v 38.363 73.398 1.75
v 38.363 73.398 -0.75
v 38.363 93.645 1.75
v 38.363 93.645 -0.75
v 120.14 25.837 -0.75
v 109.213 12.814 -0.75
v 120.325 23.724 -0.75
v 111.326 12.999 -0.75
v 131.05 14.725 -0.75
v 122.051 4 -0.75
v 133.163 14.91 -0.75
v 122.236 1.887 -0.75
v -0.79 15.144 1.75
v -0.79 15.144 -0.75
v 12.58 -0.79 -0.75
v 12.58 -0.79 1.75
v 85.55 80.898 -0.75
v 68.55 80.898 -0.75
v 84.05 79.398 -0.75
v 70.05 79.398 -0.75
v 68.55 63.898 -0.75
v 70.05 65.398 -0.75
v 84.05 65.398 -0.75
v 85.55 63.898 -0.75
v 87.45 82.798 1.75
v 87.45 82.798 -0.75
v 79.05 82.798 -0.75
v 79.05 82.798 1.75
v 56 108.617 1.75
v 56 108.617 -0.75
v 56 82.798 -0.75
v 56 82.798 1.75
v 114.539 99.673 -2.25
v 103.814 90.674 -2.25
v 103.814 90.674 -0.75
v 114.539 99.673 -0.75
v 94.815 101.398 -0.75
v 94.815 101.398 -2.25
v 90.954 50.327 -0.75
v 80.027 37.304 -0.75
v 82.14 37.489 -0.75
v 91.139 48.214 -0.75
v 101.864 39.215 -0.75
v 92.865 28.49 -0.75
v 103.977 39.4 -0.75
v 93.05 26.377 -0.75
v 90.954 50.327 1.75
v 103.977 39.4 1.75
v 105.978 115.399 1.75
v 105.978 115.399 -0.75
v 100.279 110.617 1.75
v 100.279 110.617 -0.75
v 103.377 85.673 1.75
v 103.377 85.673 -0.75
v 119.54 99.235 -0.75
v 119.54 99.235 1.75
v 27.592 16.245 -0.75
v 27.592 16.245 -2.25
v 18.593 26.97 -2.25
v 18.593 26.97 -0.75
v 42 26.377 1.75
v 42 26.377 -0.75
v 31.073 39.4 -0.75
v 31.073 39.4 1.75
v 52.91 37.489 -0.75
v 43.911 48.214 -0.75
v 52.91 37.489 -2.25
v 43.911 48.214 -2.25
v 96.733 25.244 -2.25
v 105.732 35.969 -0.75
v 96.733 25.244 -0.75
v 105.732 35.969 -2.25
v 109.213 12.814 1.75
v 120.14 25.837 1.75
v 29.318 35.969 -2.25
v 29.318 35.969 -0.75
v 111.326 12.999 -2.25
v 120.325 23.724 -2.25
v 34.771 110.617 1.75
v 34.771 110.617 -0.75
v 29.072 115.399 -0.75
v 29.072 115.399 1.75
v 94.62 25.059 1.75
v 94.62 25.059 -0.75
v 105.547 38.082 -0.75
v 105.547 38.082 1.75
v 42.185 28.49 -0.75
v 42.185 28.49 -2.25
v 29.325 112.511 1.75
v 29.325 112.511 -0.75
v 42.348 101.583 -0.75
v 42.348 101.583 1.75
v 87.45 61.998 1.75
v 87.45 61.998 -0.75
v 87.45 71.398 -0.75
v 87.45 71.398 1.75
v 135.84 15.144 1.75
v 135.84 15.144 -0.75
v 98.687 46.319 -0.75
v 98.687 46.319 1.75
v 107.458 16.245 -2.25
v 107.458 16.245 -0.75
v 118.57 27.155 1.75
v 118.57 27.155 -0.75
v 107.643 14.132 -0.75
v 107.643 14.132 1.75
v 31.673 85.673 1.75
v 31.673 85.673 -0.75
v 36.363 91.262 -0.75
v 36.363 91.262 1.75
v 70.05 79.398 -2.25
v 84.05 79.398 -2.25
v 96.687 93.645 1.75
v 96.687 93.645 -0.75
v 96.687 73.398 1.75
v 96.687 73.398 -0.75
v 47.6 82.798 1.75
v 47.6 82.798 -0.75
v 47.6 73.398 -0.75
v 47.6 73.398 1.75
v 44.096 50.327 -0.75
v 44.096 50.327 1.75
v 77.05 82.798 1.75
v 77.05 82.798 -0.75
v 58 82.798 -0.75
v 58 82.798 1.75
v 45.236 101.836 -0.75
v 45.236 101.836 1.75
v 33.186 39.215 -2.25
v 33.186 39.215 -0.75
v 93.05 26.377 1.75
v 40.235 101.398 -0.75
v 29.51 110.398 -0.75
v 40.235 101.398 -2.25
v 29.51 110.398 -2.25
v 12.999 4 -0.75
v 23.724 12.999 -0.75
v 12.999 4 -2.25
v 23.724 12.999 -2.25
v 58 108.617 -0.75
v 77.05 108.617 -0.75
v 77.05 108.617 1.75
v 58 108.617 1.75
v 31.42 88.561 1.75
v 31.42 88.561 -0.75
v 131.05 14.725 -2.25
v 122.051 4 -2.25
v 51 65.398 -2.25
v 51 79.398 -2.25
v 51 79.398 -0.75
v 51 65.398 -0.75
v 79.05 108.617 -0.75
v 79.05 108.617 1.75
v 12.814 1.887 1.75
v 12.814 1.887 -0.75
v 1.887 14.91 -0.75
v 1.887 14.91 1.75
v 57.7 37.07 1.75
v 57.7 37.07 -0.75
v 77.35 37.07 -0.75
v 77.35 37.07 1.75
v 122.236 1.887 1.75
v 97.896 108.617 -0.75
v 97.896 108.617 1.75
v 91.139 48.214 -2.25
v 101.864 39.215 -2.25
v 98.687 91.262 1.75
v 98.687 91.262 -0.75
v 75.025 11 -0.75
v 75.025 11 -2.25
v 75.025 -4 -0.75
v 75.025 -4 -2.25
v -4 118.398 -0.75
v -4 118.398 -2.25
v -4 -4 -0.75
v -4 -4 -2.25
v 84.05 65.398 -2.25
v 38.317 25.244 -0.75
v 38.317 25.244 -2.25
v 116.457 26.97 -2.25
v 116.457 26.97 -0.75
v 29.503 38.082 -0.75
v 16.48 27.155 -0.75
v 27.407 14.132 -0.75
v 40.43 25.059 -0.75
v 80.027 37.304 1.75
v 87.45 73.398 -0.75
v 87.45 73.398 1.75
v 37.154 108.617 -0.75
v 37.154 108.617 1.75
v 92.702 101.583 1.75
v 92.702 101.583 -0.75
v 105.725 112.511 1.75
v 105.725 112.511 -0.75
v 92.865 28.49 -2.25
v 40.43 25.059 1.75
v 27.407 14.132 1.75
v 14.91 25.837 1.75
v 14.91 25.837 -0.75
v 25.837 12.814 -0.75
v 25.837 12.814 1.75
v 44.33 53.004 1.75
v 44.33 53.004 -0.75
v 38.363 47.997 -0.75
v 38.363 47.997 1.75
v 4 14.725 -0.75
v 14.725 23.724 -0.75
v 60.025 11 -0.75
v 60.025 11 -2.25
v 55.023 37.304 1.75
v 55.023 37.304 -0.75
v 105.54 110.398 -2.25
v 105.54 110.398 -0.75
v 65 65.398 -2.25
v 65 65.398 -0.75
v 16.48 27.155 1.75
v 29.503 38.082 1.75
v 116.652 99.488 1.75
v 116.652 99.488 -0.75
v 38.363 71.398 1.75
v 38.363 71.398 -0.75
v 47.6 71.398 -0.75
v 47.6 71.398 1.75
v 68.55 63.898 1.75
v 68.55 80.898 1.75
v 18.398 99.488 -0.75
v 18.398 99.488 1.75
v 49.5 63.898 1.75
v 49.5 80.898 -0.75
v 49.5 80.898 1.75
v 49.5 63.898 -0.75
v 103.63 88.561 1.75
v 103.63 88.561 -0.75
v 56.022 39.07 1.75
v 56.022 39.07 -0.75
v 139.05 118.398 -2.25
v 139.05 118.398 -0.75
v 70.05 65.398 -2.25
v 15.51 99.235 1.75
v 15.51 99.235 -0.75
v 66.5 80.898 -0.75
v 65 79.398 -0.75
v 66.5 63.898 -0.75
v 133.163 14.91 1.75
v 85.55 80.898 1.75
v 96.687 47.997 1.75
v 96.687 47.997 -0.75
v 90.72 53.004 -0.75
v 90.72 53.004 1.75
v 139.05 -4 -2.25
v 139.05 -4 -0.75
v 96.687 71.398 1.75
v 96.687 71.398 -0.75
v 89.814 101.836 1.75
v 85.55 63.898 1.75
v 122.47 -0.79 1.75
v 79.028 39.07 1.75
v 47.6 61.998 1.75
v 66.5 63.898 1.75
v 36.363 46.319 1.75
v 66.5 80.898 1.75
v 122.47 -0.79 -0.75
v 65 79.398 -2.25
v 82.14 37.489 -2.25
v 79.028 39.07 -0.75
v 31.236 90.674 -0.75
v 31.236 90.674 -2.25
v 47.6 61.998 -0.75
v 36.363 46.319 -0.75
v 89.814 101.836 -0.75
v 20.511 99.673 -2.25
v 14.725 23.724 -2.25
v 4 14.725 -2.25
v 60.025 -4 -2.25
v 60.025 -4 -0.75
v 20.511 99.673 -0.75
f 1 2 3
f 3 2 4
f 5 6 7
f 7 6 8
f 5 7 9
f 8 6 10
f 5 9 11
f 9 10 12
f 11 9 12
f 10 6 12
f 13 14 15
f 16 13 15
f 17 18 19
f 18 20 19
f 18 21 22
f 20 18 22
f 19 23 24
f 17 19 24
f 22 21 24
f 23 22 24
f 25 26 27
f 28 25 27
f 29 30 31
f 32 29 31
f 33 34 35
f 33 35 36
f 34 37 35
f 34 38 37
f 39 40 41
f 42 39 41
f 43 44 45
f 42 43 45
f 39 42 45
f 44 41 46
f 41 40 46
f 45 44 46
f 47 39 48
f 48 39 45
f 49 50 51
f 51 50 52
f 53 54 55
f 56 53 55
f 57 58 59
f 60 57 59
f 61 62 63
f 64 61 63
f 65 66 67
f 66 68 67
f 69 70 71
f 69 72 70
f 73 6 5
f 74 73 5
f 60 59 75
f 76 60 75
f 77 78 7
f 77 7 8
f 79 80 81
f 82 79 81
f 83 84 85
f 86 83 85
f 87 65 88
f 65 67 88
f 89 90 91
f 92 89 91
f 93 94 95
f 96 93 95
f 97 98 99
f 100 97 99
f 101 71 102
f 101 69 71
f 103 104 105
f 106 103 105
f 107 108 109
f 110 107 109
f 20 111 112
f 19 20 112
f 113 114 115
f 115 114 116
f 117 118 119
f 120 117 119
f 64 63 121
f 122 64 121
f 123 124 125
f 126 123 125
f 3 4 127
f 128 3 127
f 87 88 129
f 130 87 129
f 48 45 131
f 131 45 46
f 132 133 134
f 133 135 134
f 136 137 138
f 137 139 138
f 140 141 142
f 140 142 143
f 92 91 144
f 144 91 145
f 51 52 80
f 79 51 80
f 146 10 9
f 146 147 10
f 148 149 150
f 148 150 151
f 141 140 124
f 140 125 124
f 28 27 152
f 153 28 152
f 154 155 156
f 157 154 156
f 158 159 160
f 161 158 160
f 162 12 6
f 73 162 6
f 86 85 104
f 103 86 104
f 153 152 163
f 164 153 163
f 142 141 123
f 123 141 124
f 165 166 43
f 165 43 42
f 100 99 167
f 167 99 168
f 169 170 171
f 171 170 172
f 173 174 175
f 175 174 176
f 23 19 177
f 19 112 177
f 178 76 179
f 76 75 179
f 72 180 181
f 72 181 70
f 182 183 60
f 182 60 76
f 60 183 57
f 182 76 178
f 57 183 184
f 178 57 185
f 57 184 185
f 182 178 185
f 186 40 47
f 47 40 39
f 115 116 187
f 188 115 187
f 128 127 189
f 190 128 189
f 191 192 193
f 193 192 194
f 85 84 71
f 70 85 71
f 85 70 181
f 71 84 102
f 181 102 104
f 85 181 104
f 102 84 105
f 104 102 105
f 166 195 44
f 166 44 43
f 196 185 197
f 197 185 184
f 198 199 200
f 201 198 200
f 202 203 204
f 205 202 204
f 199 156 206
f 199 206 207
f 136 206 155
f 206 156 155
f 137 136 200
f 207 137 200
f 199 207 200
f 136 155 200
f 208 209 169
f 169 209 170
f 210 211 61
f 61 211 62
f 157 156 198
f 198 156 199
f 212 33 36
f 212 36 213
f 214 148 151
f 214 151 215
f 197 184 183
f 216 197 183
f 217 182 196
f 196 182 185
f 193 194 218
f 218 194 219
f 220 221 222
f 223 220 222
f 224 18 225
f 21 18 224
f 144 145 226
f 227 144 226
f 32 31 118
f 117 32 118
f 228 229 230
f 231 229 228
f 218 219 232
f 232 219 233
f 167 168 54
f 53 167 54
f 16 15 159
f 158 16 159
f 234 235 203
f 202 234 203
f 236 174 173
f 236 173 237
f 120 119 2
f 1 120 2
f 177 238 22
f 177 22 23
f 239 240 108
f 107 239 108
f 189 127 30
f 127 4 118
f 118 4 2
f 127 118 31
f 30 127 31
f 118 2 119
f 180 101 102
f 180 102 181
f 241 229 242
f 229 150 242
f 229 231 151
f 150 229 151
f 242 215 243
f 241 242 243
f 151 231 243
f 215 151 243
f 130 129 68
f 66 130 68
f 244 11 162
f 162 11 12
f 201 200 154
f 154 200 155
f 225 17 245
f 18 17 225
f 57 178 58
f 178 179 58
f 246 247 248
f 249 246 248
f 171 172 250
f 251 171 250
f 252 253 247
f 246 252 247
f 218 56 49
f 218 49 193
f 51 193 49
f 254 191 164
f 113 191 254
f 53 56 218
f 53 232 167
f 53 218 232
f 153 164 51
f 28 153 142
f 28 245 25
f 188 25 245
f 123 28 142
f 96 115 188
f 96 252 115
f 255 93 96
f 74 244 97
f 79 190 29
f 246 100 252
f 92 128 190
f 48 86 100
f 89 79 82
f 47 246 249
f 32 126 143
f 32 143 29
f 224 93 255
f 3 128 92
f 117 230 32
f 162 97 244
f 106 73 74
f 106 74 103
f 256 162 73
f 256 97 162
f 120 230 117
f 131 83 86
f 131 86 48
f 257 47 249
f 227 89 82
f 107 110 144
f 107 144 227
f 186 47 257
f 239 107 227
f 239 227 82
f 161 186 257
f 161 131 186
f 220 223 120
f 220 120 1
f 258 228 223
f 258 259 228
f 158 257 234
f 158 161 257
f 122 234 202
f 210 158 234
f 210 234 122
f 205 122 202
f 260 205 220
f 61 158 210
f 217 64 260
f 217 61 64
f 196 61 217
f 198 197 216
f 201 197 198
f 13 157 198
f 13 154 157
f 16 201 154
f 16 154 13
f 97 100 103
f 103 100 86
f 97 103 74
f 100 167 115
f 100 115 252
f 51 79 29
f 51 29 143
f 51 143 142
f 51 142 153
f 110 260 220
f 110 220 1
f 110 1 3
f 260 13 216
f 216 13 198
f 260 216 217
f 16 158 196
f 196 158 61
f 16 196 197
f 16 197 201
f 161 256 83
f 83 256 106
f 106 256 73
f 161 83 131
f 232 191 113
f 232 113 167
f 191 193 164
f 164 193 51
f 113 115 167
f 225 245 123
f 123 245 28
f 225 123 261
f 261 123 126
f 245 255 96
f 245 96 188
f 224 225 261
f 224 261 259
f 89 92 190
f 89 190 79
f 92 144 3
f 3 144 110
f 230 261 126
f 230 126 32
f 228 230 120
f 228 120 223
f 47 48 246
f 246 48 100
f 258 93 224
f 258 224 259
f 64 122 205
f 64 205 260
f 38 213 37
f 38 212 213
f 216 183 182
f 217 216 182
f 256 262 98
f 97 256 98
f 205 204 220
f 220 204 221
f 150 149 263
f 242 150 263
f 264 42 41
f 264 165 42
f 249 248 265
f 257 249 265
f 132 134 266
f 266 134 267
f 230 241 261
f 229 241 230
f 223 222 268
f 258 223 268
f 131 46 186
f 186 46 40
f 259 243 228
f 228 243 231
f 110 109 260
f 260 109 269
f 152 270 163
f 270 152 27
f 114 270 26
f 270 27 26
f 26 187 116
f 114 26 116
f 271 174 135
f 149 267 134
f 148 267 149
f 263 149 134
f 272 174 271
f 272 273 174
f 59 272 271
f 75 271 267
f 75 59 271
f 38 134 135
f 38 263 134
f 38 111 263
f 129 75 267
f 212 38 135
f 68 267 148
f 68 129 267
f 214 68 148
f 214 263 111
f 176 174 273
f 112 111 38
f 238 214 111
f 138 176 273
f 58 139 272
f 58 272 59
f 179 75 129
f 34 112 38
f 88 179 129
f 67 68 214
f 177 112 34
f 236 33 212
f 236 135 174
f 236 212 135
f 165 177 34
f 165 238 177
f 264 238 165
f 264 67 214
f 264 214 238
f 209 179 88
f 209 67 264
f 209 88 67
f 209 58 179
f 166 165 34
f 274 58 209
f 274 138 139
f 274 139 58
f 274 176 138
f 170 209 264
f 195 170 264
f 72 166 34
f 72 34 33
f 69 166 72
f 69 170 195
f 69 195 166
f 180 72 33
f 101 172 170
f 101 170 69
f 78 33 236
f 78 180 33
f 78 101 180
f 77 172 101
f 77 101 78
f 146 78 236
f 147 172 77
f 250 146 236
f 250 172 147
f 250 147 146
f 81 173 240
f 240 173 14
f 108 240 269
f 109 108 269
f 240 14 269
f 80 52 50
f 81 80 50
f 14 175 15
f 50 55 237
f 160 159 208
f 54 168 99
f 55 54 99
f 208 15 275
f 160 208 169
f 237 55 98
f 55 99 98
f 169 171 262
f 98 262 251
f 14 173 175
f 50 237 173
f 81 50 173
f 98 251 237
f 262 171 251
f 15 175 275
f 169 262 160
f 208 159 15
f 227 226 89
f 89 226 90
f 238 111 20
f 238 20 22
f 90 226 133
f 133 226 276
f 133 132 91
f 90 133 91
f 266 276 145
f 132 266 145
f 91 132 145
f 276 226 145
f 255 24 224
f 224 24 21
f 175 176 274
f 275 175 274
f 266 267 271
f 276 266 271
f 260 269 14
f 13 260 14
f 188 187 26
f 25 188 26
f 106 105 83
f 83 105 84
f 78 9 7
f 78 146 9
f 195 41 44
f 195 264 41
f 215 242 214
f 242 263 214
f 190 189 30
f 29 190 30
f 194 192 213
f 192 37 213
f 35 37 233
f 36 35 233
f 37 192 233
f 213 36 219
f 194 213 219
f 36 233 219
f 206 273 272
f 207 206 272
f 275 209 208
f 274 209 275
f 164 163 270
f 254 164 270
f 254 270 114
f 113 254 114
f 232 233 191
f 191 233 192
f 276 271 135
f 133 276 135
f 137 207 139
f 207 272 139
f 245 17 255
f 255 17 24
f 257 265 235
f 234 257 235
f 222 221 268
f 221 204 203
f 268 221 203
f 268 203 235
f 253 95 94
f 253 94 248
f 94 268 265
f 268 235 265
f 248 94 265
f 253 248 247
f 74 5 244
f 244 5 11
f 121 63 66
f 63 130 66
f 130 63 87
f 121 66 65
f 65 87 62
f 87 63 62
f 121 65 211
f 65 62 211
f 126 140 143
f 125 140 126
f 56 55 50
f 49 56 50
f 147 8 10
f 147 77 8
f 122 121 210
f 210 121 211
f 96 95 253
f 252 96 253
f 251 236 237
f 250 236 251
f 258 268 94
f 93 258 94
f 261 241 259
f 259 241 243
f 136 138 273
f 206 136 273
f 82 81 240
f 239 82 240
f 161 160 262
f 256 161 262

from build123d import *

# Parameters (mm, degrees)
MODEL_W                    = 143.05
MODEL_H                    = 122.397505408
MODEL_W_2                  = 14
MODEL_H_2                  = 14
SALIENTE_EXTRUIR1_DEPTH    = 0.75
CROQUIS2_W                 = 15
CROQUIS2_H                 = 30
CORTAR_EXTRUIR1_DEPTH      = 183.633846224
CROQUIS5_W                 = 19.05
CROQUIS5_H                 = 25.819944505
CROQUIS5_W_2               = 17
CROQUIS5_H_2               = 17
SALIENTE_EXTRUIR2_DEPTH    = 2.5
S_LIDO_MOVER_COPIAR1_ANGLE = 180


with BuildPart() as part:
    # Model → Saliente-Extruir1 (new, symmetric)
    with BuildSketch(Plane.XY):
        with Locations((67.525, 57.198752704)):
            Rectangle(MODEL_W, MODEL_H)
        with Locations((58, 42)):
            Rectangle(MODEL_W_2, MODEL_H_2, mode=Mode.SUBTRACT)
        Polygon((18.593146641, 87.427779239), (29.317768845, 78.428752704), (38.316795381, 89.153374907), (27.592173177, 98.152401443), align=None, mode=Mode.SUBTRACT)
        Polygon((103.814404332, 23.723648739), (114.539026536, 14.724622204), (105.54, 4), (94.815377796, 12.999026536), align=None, mode=Mode.SUBTRACT)
        Polygon((33.186293283, 75.182675275), (43.910915486, 66.183648739), (52.909942022, 76.908270943), (42.185319818, 85.907297479), align=None, mode=Mode.SUBTRACT)
        Polygon((20.510973464, 14.724622204), (29.51, 4), (40.234622204, 12.999026536), (31.235595668, 23.723648739), align=None, mode=Mode.SUBTRACT)
        with Locations((77.05, 42)):
            Rectangle(MODEL_W_2, MODEL_H_2, mode=Mode.SUBTRACT)
        Polygon((92.864680182, 85.907297479), (101.863706717, 75.182675275), (91.139084514, 66.183648739), (82.140057978, 76.908270943), align=None, mode=Mode.SUBTRACT)
        Polygon((107.457826823, 98.152401443), (116.456853359, 87.427779239), (105.732231155, 78.428752704), (96.733204619, 89.153374907), align=None, mode=Mode.SUBTRACT)
        Polygon((4, 99.672883204), (14.724622204, 90.673856668), (23.723648739, 101.398478872), (12.999026536, 110.397505408), align=None, mode=Mode.SUBTRACT)
        Polygon((120.325377796, 90.673856668), (111.326351261, 101.398478872), (122.050973464, 110.397505408), (131.05, 99.672883204), align=None, mode=Mode.SUBTRACT)
    extrude(amount=SALIENTE_EXTRUIR1_DEPTH, both=True)

    # Croquis2 → Cortar-Extruir1 (cut, through all)
    with BuildSketch(Plane.XY.offset(0.75)):
        with Locations((67.525, 118.397505408)):
            Rectangle(CROQUIS2_W, CROQUIS2_H)
    extrude(amount=-CORTAR_EXTRUIR1_DEPTH, mode=Mode.SUBTRACT)

    # Croquis5 → Saliente-Extruir2 (add)
    with BuildSketch(Plane(origin=(0, 0, -0.75), x_dir=(-1, 0, 0), z_dir=(0, 0, -1))):
        Polygon((-122.470046698, 115.187534387), (-135.84002898, 99.25380997), (-98.686873488, 68.0786109), (-98.686873488, 23.135715021), (-103.376842573, 28.725002527), (-119.540380323, 15.162183962), (-105.977561759, -1.001353787), (-100.279300069, 3.780055495), (-34.770699931, 3.780055495), (-29.072438241, -1.001353787), (-15.509619677, 15.162183962), (-31.673157427, 28.725002527), (-36.363126512, 23.135715021), (-36.363126512, 68.0786109), (0.79002898, 99.25380997), (-12.579953302, 115.187534387), (-57.699971002, 77.327344177), (-77.350028998, 77.327344177), align=None)
        Polygon((-45.235975991, 12.561464777), (-37.154207116, 5.780055495), (-56, 5.780055495), (-56, 31.6), (-47.6, 31.6), (-47.6, 41), (-38.363126512, 41), (-38.363126512, 20.752207835), align=None, mode=Mode.SUBTRACT)
        with Locations((-67.525, 18.690027748)):
            Rectangle(CROQUIS5_W, CROQUIS5_H, mode=Mode.SUBTRACT)
        Polygon((-79.05, 5.780055495), (-97.895792884, 5.780055495), (-89.814024009, 12.561464777), (-96.686873488, 20.752207835), (-96.686873488, 41), (-87.45, 41), (-87.45, 31.6), (-79.05, 31.6), align=None, mode=Mode.SUBTRACT)
        Polygon((-116.652274615, 14.909507454), (-103.629519082, 25.836896818), (-92.702129717, 12.814141285), (-105.72488525, 1.886751921), align=None, mode=Mode.SUBTRACT)
        with Locations((-77.05, 42)):
            Rectangle(CROQUIS5_W_2, CROQUIS5_H_2, mode=Mode.SUBTRACT)
        Polygon((-42.347870283, 12.814141285), (-31.420480918, 25.836896818), (-18.397725385, 14.909507454), (-29.32511475, 1.886751921), align=None, mode=Mode.SUBTRACT)
        with Locations((-58, 42)):
            Rectangle(CROQUIS5_W_2, CROQUIS5_H_2, mode=Mode.SUBTRACT)
        Polygon((-103.976954796, 74.997790025), (-93.049565432, 88.020545558), (-80.026809899, 77.093156193), (-90.954199263, 64.07040066), align=None, mode=Mode.SUBTRACT)
        Polygon((-133.163248079, 99.487997954), (-122.235858715, 112.510753487), (-109.213103182, 101.583364122), (-120.140492546, 88.560608589), align=None, mode=Mode.SUBTRACT)
        Polygon((-118.570101438, 87.242893989), (-107.642712073, 100.265649522), (-94.61995654, 89.338260158), (-105.547345905, 76.315504625), align=None, mode=Mode.SUBTRACT)
        Polygon((-96.686873488, 66.400411638), (-90.72001128, 61.39361976), (-79.028228261, 75.327344177), (-56.021771739, 75.327344177), (-44.32998872, 61.39361976), (-38.363126512, 66.400411638), (-38.363126512, 43), (-47.6, 43), (-47.6, 52.4), (-87.45, 52.4), (-87.45, 43), (-96.686873488, 43), align=None, mode=Mode.SUBTRACT)
        Polygon((-44.095800737, 64.07040066), (-55.023190101, 77.093156193), (-42.000434568, 88.020545558), (-31.073045204, 74.997790025), align=None, mode=Mode.SUBTRACT)
        Polygon((-29.502654095, 76.315504625), (-40.43004346, 89.338260158), (-27.407287927, 100.265649522), (-16.479898562, 87.242893989), align=None, mode=Mode.SUBTRACT)
        Polygon((-14.909507454, 88.560608589), (-25.836896818, 101.583364122), (-12.814141285, 112.510753487), (-1.886751921, 99.487997954), align=None, mode=Mode.SUBTRACT)
    extrude(amount=SALIENTE_EXTRUIR2_DEPTH)


with BuildPart() as part_1:
    # Sólido-Mover/Copiar1: moved
    add(part.part.rotate(Axis((0, 57.198752704, -0.75), (1, 0, 0)), S_LIDO_MOVER_COPIAR1_ANGLE))


solid = part_1.part
